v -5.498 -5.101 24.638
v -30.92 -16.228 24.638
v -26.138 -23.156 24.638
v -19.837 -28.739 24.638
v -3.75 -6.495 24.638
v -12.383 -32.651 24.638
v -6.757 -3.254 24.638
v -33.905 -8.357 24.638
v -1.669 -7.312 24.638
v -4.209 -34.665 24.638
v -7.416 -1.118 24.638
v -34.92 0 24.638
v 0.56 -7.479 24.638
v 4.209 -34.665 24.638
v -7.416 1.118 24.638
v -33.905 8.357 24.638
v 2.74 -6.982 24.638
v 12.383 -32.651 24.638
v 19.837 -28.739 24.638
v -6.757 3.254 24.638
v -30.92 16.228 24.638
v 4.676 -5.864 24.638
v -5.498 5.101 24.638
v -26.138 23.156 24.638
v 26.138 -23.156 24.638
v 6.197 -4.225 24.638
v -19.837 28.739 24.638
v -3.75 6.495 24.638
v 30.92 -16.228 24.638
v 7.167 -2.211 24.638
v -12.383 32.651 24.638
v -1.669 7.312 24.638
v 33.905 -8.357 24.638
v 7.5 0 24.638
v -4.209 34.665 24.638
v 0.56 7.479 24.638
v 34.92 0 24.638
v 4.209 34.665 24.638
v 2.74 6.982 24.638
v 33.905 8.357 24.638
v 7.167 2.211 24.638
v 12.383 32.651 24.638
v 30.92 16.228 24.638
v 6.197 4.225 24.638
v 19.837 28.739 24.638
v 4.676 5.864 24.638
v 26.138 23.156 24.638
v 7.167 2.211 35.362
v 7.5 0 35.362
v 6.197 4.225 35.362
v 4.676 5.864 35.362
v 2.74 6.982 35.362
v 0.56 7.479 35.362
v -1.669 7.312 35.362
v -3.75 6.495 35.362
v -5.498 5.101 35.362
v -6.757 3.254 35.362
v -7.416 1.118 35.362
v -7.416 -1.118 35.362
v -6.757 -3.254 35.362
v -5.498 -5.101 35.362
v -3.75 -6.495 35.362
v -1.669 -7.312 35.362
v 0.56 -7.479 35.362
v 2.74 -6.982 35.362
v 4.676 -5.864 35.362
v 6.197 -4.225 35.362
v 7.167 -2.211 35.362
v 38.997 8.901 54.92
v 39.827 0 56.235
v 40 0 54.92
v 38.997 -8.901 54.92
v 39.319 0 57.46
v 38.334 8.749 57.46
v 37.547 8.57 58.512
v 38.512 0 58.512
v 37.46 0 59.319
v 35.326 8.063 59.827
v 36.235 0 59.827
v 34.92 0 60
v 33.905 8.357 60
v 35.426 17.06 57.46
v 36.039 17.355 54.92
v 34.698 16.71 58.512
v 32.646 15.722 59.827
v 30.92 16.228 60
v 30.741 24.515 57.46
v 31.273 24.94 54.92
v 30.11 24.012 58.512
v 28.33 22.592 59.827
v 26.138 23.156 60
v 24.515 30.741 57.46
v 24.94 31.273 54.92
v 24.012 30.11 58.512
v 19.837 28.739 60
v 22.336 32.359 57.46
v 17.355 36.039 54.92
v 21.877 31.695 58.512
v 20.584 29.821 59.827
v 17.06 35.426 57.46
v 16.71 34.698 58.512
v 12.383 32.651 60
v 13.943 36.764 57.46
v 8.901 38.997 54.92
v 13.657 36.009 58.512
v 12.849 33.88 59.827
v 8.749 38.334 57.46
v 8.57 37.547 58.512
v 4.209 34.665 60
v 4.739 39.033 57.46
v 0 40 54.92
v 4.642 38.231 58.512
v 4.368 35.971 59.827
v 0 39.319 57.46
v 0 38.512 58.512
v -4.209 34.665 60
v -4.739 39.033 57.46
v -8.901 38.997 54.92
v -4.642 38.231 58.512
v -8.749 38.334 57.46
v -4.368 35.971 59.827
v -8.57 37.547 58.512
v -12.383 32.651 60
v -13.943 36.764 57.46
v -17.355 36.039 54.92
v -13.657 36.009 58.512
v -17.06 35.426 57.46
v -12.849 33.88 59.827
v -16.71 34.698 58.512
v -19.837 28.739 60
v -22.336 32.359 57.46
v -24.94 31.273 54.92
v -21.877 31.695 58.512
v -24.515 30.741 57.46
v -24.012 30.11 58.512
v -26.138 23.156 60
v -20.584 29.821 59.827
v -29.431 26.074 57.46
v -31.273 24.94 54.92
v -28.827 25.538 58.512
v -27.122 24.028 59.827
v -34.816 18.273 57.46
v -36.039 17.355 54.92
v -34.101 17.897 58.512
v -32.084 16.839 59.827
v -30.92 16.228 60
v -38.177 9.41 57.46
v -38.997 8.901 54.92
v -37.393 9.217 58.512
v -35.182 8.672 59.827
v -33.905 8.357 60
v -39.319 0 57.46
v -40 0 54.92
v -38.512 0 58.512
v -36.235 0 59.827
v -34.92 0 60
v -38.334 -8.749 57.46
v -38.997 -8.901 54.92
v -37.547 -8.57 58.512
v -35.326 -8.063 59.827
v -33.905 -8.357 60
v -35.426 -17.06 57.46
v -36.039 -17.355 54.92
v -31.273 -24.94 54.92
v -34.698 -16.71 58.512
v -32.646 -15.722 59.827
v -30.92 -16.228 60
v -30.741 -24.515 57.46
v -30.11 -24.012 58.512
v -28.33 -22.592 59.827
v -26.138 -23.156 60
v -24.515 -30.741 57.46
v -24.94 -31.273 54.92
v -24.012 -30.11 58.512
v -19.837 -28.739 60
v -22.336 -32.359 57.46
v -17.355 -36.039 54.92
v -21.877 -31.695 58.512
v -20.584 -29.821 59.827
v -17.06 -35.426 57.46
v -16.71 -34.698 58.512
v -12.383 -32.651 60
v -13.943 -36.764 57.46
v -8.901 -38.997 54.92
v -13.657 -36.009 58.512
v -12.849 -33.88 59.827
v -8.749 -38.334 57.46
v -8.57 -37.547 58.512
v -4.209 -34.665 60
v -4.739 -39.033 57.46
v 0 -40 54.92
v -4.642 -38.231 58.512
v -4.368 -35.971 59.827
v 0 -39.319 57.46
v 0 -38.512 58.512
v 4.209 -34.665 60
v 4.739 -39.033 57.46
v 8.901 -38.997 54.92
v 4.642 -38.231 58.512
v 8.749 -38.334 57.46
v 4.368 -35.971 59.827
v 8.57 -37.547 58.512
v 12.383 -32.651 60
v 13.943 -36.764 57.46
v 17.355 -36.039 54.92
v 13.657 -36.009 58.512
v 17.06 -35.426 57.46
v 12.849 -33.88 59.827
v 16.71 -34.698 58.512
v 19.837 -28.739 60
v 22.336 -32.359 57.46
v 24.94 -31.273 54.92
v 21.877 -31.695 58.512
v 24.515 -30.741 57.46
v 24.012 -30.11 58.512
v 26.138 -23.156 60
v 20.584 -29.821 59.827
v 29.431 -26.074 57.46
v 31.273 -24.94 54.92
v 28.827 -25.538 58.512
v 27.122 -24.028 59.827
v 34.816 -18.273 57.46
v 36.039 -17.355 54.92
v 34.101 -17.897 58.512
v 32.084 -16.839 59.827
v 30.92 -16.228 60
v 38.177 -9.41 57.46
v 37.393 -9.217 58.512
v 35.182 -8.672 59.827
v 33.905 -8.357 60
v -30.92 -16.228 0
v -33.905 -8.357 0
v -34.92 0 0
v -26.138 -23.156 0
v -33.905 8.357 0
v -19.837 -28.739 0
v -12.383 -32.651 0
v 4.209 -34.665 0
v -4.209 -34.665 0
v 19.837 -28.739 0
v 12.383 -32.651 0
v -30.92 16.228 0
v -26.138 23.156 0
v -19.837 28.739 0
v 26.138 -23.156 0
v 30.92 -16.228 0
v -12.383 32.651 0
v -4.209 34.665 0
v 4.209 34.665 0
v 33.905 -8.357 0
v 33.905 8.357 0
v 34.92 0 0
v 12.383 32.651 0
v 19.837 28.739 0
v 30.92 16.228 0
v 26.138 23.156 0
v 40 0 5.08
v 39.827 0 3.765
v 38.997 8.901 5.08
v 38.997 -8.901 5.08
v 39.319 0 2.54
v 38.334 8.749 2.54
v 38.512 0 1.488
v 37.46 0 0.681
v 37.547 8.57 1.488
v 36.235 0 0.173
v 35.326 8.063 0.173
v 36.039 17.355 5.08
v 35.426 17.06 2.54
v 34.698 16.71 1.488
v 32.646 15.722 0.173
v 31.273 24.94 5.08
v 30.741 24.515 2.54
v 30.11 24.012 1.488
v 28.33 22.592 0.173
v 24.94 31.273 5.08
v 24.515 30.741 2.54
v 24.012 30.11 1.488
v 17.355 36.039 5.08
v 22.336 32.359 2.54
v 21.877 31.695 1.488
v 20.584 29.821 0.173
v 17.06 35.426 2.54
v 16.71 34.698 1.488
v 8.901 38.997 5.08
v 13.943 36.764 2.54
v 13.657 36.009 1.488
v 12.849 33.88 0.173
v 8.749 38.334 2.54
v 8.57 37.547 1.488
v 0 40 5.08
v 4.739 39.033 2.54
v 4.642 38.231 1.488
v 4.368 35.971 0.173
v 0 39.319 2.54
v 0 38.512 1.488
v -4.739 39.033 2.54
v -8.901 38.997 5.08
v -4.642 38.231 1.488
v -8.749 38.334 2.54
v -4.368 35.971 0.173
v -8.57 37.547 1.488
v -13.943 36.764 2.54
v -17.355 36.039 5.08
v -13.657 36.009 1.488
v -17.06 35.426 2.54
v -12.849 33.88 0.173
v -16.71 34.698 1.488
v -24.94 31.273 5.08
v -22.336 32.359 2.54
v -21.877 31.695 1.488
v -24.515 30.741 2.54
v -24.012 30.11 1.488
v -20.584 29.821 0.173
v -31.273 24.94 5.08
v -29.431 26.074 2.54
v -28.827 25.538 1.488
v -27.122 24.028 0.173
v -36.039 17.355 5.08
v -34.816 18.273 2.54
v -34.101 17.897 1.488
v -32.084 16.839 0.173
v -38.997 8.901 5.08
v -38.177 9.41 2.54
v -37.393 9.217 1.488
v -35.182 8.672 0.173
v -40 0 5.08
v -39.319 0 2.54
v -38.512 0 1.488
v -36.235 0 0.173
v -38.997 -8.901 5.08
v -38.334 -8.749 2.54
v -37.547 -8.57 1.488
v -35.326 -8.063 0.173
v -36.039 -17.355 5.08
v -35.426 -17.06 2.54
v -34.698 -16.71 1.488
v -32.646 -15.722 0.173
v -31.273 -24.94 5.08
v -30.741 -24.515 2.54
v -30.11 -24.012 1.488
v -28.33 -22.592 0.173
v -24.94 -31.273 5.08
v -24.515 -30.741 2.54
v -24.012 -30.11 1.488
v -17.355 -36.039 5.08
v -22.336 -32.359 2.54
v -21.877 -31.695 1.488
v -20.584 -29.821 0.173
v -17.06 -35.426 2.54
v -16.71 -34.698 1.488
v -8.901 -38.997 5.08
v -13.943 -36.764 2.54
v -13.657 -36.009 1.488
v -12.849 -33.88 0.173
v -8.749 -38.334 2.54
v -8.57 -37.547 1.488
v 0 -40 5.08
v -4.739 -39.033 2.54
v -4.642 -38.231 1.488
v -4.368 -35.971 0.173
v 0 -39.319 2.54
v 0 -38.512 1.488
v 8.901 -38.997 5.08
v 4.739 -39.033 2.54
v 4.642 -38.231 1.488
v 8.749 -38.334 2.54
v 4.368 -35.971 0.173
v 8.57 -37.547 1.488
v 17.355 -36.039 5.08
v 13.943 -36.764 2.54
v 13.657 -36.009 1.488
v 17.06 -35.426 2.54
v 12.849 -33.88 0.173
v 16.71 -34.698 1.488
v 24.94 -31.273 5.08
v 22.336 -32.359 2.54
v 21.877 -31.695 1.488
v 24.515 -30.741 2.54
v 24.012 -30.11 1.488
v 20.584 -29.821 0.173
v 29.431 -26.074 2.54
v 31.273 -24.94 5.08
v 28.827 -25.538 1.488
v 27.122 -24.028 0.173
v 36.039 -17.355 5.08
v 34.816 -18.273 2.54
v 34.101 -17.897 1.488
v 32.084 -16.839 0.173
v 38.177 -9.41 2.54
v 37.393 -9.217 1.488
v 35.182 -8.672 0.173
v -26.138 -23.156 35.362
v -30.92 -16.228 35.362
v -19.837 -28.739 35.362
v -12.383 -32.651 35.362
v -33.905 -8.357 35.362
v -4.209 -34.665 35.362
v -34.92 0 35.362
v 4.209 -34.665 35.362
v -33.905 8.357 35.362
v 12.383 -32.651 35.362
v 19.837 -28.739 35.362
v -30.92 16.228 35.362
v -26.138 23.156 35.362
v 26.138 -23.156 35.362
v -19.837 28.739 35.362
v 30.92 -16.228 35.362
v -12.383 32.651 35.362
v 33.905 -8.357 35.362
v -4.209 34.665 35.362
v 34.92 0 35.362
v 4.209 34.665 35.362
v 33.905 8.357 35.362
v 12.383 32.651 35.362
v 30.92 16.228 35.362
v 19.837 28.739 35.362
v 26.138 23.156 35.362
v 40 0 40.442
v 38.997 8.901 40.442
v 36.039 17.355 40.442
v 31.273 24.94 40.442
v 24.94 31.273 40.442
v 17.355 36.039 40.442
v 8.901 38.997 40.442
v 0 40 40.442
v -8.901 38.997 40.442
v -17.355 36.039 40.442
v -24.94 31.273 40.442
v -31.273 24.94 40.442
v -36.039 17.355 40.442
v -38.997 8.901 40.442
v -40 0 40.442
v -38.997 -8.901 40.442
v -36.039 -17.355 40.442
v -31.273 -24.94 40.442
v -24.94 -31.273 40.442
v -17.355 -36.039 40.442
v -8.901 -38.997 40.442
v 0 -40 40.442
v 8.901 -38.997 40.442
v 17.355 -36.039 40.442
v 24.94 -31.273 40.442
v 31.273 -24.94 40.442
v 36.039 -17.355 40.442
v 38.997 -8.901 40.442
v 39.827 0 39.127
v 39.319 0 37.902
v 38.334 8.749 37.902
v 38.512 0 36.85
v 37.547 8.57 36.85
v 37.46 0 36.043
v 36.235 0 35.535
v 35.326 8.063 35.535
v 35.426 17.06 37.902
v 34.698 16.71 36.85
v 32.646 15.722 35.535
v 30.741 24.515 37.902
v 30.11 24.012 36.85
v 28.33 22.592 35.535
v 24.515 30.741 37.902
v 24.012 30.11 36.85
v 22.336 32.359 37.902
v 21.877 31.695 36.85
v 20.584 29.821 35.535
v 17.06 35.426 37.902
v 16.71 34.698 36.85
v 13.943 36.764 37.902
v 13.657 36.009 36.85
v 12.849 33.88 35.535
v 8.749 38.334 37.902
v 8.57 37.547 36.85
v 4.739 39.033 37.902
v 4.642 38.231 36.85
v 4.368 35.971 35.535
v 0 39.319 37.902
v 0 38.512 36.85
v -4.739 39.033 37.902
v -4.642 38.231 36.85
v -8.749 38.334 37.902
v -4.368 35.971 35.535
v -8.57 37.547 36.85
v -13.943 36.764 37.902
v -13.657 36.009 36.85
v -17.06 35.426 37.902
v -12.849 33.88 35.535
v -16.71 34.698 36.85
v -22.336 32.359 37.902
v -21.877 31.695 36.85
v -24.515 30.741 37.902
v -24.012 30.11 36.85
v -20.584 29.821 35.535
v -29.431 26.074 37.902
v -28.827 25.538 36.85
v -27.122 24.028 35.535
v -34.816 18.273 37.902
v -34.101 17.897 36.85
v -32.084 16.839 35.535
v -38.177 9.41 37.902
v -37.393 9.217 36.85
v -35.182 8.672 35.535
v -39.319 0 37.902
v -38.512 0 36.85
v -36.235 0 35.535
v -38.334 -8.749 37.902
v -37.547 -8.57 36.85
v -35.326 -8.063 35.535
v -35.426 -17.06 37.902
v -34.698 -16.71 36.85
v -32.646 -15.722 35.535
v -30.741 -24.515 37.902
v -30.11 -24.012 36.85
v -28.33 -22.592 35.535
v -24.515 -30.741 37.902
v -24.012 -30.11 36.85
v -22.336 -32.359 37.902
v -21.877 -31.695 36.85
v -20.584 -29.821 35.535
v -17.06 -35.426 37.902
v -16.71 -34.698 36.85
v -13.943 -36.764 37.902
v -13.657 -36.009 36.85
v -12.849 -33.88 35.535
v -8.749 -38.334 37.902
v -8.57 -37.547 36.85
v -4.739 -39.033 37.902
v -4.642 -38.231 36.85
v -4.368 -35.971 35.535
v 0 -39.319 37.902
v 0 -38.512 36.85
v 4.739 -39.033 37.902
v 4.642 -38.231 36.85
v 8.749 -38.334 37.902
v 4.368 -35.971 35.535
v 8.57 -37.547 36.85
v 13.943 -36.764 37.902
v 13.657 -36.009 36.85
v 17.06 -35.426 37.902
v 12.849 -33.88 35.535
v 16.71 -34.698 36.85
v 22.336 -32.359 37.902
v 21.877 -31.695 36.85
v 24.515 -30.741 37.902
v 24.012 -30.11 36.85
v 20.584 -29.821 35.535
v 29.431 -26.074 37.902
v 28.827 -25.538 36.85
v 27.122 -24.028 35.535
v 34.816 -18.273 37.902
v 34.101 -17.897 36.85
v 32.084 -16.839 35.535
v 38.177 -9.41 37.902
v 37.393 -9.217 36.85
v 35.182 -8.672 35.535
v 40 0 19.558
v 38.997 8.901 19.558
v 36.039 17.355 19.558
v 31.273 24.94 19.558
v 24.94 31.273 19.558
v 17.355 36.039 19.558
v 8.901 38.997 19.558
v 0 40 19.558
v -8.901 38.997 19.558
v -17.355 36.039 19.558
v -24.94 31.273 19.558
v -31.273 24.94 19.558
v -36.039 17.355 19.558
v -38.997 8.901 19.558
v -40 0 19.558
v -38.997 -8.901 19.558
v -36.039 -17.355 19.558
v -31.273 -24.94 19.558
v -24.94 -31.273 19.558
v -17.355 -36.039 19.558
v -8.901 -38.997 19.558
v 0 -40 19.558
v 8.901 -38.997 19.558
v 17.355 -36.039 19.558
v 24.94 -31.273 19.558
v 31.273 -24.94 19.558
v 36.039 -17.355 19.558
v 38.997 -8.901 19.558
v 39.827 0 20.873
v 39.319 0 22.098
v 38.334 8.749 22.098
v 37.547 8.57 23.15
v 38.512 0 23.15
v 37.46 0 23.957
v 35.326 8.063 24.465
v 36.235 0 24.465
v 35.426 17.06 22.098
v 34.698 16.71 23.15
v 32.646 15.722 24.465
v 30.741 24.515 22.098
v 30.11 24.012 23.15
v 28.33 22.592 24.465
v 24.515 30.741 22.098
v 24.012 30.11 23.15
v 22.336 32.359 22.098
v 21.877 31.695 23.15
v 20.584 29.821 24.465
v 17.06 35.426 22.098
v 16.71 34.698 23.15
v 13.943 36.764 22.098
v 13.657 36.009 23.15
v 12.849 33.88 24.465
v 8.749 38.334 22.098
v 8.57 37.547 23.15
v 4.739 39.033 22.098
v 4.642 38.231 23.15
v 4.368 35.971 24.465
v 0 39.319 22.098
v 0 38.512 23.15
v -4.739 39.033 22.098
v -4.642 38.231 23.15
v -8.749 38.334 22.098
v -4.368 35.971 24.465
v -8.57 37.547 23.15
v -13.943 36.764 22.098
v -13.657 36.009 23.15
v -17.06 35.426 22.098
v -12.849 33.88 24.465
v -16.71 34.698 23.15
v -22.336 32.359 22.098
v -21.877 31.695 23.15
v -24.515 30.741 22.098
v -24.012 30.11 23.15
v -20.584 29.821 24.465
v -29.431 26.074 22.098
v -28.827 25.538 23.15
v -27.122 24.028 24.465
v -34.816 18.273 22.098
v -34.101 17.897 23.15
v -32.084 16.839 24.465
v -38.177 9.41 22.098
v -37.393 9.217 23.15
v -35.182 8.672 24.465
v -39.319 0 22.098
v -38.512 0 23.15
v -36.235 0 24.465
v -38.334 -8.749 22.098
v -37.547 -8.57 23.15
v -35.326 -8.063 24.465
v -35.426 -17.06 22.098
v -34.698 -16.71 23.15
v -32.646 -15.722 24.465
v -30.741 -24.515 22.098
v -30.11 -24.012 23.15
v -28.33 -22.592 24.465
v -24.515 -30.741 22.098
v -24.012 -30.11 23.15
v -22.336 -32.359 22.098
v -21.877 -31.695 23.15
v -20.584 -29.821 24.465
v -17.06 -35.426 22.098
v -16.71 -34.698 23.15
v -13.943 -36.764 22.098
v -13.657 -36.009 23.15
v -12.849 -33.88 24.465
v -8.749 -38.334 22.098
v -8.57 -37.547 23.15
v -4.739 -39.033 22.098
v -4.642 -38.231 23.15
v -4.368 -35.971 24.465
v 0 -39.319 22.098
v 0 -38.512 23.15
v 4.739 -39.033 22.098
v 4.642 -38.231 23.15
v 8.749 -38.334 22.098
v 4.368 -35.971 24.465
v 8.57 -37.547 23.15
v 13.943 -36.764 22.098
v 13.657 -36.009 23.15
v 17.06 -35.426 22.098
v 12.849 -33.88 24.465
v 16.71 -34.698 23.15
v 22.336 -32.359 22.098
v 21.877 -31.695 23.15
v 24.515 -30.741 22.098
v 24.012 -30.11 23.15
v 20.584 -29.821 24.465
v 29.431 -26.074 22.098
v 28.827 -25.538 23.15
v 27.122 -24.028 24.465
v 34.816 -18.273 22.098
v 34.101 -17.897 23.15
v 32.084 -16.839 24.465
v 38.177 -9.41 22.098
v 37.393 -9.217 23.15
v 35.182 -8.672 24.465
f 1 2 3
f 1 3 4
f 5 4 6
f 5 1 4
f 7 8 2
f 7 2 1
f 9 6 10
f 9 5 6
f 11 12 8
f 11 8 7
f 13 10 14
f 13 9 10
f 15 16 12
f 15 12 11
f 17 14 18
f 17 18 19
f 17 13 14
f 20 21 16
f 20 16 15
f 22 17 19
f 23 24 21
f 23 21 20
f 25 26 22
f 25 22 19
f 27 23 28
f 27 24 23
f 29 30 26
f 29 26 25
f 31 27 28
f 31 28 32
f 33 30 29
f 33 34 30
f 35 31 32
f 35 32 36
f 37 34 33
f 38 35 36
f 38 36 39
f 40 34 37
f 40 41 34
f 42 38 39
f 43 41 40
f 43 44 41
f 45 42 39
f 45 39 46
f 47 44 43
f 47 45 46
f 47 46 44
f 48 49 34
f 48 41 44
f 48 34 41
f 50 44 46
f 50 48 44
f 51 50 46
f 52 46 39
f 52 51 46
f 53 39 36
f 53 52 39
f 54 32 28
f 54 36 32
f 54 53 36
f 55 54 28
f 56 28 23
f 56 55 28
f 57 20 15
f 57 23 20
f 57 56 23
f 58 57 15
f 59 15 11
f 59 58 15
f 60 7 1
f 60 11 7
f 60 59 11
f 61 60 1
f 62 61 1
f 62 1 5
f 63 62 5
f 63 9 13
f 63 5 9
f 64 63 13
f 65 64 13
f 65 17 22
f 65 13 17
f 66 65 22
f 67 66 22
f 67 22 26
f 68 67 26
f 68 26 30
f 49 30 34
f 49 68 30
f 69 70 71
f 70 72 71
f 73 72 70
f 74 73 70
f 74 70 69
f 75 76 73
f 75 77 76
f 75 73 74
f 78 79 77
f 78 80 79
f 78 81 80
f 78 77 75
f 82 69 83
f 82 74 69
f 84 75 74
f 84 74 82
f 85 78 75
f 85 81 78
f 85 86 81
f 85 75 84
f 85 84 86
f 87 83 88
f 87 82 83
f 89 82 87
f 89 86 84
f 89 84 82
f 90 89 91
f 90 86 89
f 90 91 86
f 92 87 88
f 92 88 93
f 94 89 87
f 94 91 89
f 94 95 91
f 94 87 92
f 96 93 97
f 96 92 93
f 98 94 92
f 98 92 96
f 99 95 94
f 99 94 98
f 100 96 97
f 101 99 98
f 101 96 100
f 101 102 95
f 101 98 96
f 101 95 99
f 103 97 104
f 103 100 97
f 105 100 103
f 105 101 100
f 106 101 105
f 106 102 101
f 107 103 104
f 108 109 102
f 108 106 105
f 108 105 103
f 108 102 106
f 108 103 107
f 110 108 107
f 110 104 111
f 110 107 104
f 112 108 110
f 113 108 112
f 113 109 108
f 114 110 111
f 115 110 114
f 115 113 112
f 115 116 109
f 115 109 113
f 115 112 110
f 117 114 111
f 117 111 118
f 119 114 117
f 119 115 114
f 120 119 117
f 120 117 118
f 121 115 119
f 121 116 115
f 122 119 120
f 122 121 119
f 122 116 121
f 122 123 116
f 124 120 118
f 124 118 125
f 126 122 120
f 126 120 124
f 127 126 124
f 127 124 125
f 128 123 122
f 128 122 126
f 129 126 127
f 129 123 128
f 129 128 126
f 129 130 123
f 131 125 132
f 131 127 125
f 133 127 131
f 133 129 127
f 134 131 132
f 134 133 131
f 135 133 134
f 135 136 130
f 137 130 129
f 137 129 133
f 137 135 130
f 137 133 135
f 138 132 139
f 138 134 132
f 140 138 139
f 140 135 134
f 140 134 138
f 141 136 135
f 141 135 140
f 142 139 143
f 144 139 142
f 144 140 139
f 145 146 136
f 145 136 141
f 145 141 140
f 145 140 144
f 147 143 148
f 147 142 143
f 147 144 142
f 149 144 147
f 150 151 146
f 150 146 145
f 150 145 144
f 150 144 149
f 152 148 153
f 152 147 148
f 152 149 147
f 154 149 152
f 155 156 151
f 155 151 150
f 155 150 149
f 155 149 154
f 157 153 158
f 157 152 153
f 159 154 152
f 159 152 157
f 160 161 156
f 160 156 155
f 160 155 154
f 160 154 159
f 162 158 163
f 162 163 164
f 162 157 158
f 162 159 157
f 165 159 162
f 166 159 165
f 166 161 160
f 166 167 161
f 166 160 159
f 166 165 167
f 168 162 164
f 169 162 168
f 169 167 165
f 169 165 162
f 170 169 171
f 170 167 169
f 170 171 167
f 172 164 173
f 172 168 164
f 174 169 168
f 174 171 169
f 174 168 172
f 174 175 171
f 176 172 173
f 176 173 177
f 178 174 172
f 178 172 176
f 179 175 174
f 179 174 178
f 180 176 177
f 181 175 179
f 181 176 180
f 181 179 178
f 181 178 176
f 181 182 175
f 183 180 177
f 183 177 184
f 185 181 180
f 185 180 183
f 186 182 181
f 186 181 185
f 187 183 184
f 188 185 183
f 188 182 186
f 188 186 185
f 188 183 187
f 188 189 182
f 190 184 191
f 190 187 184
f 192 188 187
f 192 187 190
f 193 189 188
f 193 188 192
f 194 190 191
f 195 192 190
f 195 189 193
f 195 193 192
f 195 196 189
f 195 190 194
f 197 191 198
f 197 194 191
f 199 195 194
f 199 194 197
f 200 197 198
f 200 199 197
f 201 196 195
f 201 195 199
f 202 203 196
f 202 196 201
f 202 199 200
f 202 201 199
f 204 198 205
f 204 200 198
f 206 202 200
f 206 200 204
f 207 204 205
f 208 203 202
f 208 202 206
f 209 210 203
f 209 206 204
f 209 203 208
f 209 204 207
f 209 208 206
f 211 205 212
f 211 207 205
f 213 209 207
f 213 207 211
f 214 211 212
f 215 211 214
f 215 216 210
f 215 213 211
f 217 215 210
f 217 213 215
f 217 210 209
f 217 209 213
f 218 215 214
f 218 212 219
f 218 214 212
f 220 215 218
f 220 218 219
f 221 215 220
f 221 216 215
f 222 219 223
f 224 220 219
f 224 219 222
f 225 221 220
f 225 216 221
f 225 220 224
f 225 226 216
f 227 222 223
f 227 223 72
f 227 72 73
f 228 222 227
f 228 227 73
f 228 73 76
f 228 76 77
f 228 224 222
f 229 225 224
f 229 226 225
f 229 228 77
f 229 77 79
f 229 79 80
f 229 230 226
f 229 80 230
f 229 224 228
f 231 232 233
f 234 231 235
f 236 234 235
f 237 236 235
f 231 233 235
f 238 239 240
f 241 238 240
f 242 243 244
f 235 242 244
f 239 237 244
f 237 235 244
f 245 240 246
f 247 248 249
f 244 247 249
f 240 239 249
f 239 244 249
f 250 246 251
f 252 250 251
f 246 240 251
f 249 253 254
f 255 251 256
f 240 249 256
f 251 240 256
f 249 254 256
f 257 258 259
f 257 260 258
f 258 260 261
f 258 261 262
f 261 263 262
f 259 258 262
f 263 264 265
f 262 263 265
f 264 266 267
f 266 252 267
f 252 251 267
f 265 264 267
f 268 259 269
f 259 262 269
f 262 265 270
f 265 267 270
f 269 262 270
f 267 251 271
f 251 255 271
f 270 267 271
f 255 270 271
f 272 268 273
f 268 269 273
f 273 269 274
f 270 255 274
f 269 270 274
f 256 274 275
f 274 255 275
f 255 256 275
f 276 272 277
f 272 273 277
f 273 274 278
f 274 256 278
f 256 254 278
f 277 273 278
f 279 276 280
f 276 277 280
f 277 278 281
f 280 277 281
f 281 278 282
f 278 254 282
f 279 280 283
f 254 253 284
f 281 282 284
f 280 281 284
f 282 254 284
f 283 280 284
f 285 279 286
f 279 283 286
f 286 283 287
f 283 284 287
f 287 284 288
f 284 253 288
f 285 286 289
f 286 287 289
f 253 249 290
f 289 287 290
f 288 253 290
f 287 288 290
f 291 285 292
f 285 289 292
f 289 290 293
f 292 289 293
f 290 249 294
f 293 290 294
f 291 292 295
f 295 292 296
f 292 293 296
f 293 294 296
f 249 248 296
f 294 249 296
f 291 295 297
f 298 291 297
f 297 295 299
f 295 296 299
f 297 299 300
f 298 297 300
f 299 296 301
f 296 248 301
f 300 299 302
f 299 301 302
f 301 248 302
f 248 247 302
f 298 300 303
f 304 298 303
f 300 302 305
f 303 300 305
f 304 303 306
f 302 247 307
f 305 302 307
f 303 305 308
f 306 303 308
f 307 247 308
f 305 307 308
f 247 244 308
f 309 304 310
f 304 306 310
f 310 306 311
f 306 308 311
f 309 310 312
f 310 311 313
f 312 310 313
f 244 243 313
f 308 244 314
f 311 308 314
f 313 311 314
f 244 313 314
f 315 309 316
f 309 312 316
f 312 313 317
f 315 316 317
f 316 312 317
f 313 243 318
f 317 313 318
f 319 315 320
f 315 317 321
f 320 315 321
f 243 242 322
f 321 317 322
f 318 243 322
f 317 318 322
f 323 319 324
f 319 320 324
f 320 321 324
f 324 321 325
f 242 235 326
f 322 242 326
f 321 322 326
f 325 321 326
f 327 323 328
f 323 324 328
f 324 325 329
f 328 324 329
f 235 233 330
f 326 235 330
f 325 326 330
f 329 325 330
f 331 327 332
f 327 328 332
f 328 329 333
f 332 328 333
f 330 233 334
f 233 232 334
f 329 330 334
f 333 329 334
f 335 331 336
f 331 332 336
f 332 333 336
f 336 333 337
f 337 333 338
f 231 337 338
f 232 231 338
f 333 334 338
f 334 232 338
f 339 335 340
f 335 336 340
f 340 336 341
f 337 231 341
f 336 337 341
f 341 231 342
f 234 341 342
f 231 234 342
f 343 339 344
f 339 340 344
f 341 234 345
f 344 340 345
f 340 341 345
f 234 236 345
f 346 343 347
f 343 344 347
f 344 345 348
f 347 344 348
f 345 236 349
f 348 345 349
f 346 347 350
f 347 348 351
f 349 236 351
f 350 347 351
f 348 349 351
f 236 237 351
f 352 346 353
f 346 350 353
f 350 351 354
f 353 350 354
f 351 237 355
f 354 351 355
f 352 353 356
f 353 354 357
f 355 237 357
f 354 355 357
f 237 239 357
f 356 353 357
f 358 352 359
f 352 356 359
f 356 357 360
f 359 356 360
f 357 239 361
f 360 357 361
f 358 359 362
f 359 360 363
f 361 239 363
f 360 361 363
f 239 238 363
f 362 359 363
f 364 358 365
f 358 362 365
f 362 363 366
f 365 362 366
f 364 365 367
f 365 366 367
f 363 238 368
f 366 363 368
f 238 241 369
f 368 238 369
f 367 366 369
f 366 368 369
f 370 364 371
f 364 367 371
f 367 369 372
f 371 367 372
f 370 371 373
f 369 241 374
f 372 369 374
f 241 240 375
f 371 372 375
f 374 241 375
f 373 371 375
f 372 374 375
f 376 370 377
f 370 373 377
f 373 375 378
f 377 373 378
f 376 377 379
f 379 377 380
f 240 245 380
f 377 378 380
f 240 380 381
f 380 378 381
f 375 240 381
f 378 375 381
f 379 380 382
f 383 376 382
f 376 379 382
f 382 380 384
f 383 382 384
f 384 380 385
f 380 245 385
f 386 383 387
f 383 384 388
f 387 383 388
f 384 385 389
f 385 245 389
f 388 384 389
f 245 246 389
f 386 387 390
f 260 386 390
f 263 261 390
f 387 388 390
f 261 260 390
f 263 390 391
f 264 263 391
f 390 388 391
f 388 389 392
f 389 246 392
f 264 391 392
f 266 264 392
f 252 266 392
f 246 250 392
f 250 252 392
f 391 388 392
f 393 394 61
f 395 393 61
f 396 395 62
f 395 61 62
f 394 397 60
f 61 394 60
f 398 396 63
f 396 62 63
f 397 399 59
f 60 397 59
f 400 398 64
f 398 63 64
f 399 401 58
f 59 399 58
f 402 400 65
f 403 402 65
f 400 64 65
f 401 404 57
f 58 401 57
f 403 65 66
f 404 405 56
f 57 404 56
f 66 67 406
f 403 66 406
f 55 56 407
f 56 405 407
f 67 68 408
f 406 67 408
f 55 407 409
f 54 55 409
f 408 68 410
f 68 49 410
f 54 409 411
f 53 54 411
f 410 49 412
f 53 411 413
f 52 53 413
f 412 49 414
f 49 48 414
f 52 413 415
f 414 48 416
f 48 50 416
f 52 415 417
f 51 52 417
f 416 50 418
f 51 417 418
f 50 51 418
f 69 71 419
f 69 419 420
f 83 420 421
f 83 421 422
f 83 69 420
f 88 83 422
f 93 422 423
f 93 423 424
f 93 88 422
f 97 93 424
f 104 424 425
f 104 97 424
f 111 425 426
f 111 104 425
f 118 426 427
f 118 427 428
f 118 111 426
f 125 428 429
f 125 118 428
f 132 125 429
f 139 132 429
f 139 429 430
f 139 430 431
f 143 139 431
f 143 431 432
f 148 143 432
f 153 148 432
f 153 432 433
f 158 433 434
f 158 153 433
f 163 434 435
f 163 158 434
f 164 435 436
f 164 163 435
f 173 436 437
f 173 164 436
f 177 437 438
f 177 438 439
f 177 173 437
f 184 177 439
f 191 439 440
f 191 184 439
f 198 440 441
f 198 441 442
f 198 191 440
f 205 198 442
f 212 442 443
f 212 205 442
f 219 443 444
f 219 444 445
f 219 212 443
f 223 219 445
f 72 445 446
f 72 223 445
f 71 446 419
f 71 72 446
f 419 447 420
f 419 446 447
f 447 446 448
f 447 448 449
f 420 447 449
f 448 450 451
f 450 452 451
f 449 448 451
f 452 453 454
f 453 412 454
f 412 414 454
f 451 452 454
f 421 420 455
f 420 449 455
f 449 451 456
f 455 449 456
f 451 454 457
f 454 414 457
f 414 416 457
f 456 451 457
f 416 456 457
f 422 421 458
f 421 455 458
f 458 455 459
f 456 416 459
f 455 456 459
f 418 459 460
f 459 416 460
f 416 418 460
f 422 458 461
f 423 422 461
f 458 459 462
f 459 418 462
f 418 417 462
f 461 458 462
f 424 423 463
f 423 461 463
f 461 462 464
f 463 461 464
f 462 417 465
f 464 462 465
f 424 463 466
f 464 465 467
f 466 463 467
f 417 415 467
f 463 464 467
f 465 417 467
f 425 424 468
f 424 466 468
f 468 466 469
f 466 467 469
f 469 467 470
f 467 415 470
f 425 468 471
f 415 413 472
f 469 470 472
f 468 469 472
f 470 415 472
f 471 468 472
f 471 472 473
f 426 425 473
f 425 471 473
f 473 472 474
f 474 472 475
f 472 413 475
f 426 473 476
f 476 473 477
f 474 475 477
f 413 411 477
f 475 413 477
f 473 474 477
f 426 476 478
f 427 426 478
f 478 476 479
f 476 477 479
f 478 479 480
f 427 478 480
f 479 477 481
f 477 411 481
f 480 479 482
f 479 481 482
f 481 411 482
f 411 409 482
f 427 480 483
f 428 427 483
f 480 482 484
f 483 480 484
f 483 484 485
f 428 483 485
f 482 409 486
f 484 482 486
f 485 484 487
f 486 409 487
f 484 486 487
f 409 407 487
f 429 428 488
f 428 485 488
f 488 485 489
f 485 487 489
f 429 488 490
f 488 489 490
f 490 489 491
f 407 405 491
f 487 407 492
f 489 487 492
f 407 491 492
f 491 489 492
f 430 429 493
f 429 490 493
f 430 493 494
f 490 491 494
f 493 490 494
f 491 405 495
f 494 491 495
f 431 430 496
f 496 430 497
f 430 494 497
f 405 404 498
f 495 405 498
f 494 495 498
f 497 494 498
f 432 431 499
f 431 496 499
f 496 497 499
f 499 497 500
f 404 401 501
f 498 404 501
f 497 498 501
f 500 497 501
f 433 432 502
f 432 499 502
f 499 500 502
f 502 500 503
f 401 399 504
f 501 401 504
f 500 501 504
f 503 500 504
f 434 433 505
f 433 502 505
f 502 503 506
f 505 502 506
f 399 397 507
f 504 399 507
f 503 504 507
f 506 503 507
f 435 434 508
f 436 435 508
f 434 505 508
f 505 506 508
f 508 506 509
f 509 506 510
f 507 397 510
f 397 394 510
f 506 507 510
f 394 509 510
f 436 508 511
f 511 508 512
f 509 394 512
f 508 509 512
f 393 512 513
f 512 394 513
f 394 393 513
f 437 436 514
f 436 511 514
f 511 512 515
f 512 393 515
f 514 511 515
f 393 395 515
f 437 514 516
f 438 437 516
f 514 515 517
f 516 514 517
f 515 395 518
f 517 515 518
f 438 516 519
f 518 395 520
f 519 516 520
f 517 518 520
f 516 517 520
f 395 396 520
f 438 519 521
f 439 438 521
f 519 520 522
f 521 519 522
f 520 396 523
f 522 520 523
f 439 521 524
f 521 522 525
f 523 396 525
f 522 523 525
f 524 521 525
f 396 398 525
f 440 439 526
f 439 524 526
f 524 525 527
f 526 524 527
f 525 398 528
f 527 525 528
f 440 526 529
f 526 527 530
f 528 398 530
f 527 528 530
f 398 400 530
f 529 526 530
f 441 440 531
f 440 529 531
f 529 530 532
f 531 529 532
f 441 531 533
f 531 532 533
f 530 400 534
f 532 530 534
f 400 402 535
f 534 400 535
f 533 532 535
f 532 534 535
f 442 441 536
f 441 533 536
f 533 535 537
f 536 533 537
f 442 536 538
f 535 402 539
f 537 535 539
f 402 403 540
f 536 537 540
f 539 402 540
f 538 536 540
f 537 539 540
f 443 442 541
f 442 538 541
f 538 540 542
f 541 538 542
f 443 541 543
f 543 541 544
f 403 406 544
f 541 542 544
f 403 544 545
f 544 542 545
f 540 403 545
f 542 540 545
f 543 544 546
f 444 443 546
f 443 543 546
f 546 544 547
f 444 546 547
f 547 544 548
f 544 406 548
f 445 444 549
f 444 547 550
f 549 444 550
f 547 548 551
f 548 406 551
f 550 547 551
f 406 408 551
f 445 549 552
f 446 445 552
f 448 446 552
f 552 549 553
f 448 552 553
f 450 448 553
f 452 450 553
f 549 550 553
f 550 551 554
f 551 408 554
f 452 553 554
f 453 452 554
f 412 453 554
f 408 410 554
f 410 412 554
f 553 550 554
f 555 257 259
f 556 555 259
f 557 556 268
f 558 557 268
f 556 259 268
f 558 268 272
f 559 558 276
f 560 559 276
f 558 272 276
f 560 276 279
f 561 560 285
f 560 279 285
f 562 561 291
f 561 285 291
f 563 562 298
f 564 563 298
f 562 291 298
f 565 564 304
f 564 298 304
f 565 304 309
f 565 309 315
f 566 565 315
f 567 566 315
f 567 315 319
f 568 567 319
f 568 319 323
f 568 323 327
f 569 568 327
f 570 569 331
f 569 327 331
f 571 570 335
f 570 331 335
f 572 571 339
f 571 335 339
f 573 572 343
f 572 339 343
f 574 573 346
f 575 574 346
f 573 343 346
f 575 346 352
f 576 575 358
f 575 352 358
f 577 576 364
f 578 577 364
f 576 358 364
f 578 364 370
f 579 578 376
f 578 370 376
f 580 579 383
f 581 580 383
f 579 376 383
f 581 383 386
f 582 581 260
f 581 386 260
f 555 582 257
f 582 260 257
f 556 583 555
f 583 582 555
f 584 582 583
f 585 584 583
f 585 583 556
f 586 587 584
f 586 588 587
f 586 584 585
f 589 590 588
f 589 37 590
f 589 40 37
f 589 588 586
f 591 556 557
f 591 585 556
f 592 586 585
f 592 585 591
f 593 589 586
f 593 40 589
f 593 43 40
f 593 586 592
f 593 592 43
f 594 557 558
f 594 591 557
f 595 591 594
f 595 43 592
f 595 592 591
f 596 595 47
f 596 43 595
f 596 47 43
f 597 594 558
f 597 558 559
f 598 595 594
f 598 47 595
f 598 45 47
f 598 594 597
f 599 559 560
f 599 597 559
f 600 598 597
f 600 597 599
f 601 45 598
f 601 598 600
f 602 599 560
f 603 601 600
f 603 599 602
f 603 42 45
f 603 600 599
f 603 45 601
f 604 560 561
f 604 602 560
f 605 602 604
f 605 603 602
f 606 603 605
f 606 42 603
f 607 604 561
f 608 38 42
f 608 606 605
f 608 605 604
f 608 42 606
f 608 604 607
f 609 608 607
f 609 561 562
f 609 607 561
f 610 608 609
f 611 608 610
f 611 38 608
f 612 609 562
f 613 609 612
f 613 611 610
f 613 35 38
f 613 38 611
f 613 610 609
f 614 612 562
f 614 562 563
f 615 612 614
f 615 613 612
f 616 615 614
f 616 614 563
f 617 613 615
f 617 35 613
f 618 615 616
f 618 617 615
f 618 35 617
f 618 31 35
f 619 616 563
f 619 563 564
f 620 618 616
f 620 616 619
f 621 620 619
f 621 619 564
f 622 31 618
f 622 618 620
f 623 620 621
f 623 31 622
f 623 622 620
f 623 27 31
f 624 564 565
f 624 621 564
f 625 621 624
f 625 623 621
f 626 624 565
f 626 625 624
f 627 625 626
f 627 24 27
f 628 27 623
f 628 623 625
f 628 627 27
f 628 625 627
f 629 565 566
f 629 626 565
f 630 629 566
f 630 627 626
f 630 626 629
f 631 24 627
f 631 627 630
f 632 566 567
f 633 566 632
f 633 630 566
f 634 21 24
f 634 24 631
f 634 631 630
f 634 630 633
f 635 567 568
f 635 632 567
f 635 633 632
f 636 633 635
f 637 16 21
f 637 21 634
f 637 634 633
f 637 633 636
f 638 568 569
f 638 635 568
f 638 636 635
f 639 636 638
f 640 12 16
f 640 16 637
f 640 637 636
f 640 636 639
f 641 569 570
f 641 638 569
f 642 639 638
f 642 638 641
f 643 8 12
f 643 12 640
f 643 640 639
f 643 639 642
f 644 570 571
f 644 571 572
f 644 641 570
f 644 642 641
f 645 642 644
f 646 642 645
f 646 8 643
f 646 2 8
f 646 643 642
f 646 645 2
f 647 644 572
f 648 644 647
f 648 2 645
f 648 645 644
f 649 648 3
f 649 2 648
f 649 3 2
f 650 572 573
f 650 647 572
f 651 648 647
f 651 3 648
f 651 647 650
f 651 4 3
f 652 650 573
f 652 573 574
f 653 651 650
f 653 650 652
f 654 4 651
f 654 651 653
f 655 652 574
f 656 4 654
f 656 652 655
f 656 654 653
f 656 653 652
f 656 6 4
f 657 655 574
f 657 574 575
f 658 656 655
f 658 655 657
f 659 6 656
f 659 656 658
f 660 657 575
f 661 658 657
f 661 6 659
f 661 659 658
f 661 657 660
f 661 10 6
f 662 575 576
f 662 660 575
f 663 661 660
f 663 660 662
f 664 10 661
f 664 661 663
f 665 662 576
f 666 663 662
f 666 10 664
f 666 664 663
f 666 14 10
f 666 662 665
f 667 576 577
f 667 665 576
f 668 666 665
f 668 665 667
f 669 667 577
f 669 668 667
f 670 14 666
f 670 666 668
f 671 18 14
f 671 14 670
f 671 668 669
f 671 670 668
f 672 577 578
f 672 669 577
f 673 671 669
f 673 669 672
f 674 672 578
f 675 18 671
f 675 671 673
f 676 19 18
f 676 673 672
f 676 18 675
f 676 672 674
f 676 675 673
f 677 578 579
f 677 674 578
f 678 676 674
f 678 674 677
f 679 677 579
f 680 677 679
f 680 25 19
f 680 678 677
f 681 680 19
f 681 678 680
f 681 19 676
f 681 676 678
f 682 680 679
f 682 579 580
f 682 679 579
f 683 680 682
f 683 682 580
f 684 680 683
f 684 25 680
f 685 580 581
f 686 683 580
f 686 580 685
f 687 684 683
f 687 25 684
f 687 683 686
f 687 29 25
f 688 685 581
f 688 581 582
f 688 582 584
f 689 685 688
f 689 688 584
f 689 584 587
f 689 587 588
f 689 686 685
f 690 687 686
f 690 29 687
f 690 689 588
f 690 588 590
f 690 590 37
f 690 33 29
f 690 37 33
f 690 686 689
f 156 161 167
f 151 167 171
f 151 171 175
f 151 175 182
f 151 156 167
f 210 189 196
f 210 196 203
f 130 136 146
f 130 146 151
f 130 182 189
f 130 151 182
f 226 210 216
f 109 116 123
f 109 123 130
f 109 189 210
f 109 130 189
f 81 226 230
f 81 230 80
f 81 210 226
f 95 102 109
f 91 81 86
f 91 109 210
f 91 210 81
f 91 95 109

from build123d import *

# Parameters (mm, degrees)
F0_R     = 40
F1_DEPTH = 24.638
F2_R     = 5.08
F3_R     = 7.5
F4_DEPTH = 30


with BuildPart() as f1:
    # F0 (on Top) → F1 (new body)
    with BuildSketch(Plane.XY):
        Circle(F0_R)
    extrude(amount=F1_DEPTH)

    # F2
    f2_edges = [f1.edges().sort_by_distance(p)[0] for p in [
        (-40, 0, 24.638),
        (-40, 0, 0),
    ]]
    fillet(f2_edges, radius=F2_R)

    # F3 (on Top) → F4 (join)
    with BuildSketch(Plane.XY):
        Circle(F3_R)
    extrude(amount=F4_DEPTH)

    # F5: F1 across face


with BuildPart() as f1_1:
    add(f1.part)
    add(f1.part.mirror(Plane.XY.offset(30)))


solid = f1_1.part
